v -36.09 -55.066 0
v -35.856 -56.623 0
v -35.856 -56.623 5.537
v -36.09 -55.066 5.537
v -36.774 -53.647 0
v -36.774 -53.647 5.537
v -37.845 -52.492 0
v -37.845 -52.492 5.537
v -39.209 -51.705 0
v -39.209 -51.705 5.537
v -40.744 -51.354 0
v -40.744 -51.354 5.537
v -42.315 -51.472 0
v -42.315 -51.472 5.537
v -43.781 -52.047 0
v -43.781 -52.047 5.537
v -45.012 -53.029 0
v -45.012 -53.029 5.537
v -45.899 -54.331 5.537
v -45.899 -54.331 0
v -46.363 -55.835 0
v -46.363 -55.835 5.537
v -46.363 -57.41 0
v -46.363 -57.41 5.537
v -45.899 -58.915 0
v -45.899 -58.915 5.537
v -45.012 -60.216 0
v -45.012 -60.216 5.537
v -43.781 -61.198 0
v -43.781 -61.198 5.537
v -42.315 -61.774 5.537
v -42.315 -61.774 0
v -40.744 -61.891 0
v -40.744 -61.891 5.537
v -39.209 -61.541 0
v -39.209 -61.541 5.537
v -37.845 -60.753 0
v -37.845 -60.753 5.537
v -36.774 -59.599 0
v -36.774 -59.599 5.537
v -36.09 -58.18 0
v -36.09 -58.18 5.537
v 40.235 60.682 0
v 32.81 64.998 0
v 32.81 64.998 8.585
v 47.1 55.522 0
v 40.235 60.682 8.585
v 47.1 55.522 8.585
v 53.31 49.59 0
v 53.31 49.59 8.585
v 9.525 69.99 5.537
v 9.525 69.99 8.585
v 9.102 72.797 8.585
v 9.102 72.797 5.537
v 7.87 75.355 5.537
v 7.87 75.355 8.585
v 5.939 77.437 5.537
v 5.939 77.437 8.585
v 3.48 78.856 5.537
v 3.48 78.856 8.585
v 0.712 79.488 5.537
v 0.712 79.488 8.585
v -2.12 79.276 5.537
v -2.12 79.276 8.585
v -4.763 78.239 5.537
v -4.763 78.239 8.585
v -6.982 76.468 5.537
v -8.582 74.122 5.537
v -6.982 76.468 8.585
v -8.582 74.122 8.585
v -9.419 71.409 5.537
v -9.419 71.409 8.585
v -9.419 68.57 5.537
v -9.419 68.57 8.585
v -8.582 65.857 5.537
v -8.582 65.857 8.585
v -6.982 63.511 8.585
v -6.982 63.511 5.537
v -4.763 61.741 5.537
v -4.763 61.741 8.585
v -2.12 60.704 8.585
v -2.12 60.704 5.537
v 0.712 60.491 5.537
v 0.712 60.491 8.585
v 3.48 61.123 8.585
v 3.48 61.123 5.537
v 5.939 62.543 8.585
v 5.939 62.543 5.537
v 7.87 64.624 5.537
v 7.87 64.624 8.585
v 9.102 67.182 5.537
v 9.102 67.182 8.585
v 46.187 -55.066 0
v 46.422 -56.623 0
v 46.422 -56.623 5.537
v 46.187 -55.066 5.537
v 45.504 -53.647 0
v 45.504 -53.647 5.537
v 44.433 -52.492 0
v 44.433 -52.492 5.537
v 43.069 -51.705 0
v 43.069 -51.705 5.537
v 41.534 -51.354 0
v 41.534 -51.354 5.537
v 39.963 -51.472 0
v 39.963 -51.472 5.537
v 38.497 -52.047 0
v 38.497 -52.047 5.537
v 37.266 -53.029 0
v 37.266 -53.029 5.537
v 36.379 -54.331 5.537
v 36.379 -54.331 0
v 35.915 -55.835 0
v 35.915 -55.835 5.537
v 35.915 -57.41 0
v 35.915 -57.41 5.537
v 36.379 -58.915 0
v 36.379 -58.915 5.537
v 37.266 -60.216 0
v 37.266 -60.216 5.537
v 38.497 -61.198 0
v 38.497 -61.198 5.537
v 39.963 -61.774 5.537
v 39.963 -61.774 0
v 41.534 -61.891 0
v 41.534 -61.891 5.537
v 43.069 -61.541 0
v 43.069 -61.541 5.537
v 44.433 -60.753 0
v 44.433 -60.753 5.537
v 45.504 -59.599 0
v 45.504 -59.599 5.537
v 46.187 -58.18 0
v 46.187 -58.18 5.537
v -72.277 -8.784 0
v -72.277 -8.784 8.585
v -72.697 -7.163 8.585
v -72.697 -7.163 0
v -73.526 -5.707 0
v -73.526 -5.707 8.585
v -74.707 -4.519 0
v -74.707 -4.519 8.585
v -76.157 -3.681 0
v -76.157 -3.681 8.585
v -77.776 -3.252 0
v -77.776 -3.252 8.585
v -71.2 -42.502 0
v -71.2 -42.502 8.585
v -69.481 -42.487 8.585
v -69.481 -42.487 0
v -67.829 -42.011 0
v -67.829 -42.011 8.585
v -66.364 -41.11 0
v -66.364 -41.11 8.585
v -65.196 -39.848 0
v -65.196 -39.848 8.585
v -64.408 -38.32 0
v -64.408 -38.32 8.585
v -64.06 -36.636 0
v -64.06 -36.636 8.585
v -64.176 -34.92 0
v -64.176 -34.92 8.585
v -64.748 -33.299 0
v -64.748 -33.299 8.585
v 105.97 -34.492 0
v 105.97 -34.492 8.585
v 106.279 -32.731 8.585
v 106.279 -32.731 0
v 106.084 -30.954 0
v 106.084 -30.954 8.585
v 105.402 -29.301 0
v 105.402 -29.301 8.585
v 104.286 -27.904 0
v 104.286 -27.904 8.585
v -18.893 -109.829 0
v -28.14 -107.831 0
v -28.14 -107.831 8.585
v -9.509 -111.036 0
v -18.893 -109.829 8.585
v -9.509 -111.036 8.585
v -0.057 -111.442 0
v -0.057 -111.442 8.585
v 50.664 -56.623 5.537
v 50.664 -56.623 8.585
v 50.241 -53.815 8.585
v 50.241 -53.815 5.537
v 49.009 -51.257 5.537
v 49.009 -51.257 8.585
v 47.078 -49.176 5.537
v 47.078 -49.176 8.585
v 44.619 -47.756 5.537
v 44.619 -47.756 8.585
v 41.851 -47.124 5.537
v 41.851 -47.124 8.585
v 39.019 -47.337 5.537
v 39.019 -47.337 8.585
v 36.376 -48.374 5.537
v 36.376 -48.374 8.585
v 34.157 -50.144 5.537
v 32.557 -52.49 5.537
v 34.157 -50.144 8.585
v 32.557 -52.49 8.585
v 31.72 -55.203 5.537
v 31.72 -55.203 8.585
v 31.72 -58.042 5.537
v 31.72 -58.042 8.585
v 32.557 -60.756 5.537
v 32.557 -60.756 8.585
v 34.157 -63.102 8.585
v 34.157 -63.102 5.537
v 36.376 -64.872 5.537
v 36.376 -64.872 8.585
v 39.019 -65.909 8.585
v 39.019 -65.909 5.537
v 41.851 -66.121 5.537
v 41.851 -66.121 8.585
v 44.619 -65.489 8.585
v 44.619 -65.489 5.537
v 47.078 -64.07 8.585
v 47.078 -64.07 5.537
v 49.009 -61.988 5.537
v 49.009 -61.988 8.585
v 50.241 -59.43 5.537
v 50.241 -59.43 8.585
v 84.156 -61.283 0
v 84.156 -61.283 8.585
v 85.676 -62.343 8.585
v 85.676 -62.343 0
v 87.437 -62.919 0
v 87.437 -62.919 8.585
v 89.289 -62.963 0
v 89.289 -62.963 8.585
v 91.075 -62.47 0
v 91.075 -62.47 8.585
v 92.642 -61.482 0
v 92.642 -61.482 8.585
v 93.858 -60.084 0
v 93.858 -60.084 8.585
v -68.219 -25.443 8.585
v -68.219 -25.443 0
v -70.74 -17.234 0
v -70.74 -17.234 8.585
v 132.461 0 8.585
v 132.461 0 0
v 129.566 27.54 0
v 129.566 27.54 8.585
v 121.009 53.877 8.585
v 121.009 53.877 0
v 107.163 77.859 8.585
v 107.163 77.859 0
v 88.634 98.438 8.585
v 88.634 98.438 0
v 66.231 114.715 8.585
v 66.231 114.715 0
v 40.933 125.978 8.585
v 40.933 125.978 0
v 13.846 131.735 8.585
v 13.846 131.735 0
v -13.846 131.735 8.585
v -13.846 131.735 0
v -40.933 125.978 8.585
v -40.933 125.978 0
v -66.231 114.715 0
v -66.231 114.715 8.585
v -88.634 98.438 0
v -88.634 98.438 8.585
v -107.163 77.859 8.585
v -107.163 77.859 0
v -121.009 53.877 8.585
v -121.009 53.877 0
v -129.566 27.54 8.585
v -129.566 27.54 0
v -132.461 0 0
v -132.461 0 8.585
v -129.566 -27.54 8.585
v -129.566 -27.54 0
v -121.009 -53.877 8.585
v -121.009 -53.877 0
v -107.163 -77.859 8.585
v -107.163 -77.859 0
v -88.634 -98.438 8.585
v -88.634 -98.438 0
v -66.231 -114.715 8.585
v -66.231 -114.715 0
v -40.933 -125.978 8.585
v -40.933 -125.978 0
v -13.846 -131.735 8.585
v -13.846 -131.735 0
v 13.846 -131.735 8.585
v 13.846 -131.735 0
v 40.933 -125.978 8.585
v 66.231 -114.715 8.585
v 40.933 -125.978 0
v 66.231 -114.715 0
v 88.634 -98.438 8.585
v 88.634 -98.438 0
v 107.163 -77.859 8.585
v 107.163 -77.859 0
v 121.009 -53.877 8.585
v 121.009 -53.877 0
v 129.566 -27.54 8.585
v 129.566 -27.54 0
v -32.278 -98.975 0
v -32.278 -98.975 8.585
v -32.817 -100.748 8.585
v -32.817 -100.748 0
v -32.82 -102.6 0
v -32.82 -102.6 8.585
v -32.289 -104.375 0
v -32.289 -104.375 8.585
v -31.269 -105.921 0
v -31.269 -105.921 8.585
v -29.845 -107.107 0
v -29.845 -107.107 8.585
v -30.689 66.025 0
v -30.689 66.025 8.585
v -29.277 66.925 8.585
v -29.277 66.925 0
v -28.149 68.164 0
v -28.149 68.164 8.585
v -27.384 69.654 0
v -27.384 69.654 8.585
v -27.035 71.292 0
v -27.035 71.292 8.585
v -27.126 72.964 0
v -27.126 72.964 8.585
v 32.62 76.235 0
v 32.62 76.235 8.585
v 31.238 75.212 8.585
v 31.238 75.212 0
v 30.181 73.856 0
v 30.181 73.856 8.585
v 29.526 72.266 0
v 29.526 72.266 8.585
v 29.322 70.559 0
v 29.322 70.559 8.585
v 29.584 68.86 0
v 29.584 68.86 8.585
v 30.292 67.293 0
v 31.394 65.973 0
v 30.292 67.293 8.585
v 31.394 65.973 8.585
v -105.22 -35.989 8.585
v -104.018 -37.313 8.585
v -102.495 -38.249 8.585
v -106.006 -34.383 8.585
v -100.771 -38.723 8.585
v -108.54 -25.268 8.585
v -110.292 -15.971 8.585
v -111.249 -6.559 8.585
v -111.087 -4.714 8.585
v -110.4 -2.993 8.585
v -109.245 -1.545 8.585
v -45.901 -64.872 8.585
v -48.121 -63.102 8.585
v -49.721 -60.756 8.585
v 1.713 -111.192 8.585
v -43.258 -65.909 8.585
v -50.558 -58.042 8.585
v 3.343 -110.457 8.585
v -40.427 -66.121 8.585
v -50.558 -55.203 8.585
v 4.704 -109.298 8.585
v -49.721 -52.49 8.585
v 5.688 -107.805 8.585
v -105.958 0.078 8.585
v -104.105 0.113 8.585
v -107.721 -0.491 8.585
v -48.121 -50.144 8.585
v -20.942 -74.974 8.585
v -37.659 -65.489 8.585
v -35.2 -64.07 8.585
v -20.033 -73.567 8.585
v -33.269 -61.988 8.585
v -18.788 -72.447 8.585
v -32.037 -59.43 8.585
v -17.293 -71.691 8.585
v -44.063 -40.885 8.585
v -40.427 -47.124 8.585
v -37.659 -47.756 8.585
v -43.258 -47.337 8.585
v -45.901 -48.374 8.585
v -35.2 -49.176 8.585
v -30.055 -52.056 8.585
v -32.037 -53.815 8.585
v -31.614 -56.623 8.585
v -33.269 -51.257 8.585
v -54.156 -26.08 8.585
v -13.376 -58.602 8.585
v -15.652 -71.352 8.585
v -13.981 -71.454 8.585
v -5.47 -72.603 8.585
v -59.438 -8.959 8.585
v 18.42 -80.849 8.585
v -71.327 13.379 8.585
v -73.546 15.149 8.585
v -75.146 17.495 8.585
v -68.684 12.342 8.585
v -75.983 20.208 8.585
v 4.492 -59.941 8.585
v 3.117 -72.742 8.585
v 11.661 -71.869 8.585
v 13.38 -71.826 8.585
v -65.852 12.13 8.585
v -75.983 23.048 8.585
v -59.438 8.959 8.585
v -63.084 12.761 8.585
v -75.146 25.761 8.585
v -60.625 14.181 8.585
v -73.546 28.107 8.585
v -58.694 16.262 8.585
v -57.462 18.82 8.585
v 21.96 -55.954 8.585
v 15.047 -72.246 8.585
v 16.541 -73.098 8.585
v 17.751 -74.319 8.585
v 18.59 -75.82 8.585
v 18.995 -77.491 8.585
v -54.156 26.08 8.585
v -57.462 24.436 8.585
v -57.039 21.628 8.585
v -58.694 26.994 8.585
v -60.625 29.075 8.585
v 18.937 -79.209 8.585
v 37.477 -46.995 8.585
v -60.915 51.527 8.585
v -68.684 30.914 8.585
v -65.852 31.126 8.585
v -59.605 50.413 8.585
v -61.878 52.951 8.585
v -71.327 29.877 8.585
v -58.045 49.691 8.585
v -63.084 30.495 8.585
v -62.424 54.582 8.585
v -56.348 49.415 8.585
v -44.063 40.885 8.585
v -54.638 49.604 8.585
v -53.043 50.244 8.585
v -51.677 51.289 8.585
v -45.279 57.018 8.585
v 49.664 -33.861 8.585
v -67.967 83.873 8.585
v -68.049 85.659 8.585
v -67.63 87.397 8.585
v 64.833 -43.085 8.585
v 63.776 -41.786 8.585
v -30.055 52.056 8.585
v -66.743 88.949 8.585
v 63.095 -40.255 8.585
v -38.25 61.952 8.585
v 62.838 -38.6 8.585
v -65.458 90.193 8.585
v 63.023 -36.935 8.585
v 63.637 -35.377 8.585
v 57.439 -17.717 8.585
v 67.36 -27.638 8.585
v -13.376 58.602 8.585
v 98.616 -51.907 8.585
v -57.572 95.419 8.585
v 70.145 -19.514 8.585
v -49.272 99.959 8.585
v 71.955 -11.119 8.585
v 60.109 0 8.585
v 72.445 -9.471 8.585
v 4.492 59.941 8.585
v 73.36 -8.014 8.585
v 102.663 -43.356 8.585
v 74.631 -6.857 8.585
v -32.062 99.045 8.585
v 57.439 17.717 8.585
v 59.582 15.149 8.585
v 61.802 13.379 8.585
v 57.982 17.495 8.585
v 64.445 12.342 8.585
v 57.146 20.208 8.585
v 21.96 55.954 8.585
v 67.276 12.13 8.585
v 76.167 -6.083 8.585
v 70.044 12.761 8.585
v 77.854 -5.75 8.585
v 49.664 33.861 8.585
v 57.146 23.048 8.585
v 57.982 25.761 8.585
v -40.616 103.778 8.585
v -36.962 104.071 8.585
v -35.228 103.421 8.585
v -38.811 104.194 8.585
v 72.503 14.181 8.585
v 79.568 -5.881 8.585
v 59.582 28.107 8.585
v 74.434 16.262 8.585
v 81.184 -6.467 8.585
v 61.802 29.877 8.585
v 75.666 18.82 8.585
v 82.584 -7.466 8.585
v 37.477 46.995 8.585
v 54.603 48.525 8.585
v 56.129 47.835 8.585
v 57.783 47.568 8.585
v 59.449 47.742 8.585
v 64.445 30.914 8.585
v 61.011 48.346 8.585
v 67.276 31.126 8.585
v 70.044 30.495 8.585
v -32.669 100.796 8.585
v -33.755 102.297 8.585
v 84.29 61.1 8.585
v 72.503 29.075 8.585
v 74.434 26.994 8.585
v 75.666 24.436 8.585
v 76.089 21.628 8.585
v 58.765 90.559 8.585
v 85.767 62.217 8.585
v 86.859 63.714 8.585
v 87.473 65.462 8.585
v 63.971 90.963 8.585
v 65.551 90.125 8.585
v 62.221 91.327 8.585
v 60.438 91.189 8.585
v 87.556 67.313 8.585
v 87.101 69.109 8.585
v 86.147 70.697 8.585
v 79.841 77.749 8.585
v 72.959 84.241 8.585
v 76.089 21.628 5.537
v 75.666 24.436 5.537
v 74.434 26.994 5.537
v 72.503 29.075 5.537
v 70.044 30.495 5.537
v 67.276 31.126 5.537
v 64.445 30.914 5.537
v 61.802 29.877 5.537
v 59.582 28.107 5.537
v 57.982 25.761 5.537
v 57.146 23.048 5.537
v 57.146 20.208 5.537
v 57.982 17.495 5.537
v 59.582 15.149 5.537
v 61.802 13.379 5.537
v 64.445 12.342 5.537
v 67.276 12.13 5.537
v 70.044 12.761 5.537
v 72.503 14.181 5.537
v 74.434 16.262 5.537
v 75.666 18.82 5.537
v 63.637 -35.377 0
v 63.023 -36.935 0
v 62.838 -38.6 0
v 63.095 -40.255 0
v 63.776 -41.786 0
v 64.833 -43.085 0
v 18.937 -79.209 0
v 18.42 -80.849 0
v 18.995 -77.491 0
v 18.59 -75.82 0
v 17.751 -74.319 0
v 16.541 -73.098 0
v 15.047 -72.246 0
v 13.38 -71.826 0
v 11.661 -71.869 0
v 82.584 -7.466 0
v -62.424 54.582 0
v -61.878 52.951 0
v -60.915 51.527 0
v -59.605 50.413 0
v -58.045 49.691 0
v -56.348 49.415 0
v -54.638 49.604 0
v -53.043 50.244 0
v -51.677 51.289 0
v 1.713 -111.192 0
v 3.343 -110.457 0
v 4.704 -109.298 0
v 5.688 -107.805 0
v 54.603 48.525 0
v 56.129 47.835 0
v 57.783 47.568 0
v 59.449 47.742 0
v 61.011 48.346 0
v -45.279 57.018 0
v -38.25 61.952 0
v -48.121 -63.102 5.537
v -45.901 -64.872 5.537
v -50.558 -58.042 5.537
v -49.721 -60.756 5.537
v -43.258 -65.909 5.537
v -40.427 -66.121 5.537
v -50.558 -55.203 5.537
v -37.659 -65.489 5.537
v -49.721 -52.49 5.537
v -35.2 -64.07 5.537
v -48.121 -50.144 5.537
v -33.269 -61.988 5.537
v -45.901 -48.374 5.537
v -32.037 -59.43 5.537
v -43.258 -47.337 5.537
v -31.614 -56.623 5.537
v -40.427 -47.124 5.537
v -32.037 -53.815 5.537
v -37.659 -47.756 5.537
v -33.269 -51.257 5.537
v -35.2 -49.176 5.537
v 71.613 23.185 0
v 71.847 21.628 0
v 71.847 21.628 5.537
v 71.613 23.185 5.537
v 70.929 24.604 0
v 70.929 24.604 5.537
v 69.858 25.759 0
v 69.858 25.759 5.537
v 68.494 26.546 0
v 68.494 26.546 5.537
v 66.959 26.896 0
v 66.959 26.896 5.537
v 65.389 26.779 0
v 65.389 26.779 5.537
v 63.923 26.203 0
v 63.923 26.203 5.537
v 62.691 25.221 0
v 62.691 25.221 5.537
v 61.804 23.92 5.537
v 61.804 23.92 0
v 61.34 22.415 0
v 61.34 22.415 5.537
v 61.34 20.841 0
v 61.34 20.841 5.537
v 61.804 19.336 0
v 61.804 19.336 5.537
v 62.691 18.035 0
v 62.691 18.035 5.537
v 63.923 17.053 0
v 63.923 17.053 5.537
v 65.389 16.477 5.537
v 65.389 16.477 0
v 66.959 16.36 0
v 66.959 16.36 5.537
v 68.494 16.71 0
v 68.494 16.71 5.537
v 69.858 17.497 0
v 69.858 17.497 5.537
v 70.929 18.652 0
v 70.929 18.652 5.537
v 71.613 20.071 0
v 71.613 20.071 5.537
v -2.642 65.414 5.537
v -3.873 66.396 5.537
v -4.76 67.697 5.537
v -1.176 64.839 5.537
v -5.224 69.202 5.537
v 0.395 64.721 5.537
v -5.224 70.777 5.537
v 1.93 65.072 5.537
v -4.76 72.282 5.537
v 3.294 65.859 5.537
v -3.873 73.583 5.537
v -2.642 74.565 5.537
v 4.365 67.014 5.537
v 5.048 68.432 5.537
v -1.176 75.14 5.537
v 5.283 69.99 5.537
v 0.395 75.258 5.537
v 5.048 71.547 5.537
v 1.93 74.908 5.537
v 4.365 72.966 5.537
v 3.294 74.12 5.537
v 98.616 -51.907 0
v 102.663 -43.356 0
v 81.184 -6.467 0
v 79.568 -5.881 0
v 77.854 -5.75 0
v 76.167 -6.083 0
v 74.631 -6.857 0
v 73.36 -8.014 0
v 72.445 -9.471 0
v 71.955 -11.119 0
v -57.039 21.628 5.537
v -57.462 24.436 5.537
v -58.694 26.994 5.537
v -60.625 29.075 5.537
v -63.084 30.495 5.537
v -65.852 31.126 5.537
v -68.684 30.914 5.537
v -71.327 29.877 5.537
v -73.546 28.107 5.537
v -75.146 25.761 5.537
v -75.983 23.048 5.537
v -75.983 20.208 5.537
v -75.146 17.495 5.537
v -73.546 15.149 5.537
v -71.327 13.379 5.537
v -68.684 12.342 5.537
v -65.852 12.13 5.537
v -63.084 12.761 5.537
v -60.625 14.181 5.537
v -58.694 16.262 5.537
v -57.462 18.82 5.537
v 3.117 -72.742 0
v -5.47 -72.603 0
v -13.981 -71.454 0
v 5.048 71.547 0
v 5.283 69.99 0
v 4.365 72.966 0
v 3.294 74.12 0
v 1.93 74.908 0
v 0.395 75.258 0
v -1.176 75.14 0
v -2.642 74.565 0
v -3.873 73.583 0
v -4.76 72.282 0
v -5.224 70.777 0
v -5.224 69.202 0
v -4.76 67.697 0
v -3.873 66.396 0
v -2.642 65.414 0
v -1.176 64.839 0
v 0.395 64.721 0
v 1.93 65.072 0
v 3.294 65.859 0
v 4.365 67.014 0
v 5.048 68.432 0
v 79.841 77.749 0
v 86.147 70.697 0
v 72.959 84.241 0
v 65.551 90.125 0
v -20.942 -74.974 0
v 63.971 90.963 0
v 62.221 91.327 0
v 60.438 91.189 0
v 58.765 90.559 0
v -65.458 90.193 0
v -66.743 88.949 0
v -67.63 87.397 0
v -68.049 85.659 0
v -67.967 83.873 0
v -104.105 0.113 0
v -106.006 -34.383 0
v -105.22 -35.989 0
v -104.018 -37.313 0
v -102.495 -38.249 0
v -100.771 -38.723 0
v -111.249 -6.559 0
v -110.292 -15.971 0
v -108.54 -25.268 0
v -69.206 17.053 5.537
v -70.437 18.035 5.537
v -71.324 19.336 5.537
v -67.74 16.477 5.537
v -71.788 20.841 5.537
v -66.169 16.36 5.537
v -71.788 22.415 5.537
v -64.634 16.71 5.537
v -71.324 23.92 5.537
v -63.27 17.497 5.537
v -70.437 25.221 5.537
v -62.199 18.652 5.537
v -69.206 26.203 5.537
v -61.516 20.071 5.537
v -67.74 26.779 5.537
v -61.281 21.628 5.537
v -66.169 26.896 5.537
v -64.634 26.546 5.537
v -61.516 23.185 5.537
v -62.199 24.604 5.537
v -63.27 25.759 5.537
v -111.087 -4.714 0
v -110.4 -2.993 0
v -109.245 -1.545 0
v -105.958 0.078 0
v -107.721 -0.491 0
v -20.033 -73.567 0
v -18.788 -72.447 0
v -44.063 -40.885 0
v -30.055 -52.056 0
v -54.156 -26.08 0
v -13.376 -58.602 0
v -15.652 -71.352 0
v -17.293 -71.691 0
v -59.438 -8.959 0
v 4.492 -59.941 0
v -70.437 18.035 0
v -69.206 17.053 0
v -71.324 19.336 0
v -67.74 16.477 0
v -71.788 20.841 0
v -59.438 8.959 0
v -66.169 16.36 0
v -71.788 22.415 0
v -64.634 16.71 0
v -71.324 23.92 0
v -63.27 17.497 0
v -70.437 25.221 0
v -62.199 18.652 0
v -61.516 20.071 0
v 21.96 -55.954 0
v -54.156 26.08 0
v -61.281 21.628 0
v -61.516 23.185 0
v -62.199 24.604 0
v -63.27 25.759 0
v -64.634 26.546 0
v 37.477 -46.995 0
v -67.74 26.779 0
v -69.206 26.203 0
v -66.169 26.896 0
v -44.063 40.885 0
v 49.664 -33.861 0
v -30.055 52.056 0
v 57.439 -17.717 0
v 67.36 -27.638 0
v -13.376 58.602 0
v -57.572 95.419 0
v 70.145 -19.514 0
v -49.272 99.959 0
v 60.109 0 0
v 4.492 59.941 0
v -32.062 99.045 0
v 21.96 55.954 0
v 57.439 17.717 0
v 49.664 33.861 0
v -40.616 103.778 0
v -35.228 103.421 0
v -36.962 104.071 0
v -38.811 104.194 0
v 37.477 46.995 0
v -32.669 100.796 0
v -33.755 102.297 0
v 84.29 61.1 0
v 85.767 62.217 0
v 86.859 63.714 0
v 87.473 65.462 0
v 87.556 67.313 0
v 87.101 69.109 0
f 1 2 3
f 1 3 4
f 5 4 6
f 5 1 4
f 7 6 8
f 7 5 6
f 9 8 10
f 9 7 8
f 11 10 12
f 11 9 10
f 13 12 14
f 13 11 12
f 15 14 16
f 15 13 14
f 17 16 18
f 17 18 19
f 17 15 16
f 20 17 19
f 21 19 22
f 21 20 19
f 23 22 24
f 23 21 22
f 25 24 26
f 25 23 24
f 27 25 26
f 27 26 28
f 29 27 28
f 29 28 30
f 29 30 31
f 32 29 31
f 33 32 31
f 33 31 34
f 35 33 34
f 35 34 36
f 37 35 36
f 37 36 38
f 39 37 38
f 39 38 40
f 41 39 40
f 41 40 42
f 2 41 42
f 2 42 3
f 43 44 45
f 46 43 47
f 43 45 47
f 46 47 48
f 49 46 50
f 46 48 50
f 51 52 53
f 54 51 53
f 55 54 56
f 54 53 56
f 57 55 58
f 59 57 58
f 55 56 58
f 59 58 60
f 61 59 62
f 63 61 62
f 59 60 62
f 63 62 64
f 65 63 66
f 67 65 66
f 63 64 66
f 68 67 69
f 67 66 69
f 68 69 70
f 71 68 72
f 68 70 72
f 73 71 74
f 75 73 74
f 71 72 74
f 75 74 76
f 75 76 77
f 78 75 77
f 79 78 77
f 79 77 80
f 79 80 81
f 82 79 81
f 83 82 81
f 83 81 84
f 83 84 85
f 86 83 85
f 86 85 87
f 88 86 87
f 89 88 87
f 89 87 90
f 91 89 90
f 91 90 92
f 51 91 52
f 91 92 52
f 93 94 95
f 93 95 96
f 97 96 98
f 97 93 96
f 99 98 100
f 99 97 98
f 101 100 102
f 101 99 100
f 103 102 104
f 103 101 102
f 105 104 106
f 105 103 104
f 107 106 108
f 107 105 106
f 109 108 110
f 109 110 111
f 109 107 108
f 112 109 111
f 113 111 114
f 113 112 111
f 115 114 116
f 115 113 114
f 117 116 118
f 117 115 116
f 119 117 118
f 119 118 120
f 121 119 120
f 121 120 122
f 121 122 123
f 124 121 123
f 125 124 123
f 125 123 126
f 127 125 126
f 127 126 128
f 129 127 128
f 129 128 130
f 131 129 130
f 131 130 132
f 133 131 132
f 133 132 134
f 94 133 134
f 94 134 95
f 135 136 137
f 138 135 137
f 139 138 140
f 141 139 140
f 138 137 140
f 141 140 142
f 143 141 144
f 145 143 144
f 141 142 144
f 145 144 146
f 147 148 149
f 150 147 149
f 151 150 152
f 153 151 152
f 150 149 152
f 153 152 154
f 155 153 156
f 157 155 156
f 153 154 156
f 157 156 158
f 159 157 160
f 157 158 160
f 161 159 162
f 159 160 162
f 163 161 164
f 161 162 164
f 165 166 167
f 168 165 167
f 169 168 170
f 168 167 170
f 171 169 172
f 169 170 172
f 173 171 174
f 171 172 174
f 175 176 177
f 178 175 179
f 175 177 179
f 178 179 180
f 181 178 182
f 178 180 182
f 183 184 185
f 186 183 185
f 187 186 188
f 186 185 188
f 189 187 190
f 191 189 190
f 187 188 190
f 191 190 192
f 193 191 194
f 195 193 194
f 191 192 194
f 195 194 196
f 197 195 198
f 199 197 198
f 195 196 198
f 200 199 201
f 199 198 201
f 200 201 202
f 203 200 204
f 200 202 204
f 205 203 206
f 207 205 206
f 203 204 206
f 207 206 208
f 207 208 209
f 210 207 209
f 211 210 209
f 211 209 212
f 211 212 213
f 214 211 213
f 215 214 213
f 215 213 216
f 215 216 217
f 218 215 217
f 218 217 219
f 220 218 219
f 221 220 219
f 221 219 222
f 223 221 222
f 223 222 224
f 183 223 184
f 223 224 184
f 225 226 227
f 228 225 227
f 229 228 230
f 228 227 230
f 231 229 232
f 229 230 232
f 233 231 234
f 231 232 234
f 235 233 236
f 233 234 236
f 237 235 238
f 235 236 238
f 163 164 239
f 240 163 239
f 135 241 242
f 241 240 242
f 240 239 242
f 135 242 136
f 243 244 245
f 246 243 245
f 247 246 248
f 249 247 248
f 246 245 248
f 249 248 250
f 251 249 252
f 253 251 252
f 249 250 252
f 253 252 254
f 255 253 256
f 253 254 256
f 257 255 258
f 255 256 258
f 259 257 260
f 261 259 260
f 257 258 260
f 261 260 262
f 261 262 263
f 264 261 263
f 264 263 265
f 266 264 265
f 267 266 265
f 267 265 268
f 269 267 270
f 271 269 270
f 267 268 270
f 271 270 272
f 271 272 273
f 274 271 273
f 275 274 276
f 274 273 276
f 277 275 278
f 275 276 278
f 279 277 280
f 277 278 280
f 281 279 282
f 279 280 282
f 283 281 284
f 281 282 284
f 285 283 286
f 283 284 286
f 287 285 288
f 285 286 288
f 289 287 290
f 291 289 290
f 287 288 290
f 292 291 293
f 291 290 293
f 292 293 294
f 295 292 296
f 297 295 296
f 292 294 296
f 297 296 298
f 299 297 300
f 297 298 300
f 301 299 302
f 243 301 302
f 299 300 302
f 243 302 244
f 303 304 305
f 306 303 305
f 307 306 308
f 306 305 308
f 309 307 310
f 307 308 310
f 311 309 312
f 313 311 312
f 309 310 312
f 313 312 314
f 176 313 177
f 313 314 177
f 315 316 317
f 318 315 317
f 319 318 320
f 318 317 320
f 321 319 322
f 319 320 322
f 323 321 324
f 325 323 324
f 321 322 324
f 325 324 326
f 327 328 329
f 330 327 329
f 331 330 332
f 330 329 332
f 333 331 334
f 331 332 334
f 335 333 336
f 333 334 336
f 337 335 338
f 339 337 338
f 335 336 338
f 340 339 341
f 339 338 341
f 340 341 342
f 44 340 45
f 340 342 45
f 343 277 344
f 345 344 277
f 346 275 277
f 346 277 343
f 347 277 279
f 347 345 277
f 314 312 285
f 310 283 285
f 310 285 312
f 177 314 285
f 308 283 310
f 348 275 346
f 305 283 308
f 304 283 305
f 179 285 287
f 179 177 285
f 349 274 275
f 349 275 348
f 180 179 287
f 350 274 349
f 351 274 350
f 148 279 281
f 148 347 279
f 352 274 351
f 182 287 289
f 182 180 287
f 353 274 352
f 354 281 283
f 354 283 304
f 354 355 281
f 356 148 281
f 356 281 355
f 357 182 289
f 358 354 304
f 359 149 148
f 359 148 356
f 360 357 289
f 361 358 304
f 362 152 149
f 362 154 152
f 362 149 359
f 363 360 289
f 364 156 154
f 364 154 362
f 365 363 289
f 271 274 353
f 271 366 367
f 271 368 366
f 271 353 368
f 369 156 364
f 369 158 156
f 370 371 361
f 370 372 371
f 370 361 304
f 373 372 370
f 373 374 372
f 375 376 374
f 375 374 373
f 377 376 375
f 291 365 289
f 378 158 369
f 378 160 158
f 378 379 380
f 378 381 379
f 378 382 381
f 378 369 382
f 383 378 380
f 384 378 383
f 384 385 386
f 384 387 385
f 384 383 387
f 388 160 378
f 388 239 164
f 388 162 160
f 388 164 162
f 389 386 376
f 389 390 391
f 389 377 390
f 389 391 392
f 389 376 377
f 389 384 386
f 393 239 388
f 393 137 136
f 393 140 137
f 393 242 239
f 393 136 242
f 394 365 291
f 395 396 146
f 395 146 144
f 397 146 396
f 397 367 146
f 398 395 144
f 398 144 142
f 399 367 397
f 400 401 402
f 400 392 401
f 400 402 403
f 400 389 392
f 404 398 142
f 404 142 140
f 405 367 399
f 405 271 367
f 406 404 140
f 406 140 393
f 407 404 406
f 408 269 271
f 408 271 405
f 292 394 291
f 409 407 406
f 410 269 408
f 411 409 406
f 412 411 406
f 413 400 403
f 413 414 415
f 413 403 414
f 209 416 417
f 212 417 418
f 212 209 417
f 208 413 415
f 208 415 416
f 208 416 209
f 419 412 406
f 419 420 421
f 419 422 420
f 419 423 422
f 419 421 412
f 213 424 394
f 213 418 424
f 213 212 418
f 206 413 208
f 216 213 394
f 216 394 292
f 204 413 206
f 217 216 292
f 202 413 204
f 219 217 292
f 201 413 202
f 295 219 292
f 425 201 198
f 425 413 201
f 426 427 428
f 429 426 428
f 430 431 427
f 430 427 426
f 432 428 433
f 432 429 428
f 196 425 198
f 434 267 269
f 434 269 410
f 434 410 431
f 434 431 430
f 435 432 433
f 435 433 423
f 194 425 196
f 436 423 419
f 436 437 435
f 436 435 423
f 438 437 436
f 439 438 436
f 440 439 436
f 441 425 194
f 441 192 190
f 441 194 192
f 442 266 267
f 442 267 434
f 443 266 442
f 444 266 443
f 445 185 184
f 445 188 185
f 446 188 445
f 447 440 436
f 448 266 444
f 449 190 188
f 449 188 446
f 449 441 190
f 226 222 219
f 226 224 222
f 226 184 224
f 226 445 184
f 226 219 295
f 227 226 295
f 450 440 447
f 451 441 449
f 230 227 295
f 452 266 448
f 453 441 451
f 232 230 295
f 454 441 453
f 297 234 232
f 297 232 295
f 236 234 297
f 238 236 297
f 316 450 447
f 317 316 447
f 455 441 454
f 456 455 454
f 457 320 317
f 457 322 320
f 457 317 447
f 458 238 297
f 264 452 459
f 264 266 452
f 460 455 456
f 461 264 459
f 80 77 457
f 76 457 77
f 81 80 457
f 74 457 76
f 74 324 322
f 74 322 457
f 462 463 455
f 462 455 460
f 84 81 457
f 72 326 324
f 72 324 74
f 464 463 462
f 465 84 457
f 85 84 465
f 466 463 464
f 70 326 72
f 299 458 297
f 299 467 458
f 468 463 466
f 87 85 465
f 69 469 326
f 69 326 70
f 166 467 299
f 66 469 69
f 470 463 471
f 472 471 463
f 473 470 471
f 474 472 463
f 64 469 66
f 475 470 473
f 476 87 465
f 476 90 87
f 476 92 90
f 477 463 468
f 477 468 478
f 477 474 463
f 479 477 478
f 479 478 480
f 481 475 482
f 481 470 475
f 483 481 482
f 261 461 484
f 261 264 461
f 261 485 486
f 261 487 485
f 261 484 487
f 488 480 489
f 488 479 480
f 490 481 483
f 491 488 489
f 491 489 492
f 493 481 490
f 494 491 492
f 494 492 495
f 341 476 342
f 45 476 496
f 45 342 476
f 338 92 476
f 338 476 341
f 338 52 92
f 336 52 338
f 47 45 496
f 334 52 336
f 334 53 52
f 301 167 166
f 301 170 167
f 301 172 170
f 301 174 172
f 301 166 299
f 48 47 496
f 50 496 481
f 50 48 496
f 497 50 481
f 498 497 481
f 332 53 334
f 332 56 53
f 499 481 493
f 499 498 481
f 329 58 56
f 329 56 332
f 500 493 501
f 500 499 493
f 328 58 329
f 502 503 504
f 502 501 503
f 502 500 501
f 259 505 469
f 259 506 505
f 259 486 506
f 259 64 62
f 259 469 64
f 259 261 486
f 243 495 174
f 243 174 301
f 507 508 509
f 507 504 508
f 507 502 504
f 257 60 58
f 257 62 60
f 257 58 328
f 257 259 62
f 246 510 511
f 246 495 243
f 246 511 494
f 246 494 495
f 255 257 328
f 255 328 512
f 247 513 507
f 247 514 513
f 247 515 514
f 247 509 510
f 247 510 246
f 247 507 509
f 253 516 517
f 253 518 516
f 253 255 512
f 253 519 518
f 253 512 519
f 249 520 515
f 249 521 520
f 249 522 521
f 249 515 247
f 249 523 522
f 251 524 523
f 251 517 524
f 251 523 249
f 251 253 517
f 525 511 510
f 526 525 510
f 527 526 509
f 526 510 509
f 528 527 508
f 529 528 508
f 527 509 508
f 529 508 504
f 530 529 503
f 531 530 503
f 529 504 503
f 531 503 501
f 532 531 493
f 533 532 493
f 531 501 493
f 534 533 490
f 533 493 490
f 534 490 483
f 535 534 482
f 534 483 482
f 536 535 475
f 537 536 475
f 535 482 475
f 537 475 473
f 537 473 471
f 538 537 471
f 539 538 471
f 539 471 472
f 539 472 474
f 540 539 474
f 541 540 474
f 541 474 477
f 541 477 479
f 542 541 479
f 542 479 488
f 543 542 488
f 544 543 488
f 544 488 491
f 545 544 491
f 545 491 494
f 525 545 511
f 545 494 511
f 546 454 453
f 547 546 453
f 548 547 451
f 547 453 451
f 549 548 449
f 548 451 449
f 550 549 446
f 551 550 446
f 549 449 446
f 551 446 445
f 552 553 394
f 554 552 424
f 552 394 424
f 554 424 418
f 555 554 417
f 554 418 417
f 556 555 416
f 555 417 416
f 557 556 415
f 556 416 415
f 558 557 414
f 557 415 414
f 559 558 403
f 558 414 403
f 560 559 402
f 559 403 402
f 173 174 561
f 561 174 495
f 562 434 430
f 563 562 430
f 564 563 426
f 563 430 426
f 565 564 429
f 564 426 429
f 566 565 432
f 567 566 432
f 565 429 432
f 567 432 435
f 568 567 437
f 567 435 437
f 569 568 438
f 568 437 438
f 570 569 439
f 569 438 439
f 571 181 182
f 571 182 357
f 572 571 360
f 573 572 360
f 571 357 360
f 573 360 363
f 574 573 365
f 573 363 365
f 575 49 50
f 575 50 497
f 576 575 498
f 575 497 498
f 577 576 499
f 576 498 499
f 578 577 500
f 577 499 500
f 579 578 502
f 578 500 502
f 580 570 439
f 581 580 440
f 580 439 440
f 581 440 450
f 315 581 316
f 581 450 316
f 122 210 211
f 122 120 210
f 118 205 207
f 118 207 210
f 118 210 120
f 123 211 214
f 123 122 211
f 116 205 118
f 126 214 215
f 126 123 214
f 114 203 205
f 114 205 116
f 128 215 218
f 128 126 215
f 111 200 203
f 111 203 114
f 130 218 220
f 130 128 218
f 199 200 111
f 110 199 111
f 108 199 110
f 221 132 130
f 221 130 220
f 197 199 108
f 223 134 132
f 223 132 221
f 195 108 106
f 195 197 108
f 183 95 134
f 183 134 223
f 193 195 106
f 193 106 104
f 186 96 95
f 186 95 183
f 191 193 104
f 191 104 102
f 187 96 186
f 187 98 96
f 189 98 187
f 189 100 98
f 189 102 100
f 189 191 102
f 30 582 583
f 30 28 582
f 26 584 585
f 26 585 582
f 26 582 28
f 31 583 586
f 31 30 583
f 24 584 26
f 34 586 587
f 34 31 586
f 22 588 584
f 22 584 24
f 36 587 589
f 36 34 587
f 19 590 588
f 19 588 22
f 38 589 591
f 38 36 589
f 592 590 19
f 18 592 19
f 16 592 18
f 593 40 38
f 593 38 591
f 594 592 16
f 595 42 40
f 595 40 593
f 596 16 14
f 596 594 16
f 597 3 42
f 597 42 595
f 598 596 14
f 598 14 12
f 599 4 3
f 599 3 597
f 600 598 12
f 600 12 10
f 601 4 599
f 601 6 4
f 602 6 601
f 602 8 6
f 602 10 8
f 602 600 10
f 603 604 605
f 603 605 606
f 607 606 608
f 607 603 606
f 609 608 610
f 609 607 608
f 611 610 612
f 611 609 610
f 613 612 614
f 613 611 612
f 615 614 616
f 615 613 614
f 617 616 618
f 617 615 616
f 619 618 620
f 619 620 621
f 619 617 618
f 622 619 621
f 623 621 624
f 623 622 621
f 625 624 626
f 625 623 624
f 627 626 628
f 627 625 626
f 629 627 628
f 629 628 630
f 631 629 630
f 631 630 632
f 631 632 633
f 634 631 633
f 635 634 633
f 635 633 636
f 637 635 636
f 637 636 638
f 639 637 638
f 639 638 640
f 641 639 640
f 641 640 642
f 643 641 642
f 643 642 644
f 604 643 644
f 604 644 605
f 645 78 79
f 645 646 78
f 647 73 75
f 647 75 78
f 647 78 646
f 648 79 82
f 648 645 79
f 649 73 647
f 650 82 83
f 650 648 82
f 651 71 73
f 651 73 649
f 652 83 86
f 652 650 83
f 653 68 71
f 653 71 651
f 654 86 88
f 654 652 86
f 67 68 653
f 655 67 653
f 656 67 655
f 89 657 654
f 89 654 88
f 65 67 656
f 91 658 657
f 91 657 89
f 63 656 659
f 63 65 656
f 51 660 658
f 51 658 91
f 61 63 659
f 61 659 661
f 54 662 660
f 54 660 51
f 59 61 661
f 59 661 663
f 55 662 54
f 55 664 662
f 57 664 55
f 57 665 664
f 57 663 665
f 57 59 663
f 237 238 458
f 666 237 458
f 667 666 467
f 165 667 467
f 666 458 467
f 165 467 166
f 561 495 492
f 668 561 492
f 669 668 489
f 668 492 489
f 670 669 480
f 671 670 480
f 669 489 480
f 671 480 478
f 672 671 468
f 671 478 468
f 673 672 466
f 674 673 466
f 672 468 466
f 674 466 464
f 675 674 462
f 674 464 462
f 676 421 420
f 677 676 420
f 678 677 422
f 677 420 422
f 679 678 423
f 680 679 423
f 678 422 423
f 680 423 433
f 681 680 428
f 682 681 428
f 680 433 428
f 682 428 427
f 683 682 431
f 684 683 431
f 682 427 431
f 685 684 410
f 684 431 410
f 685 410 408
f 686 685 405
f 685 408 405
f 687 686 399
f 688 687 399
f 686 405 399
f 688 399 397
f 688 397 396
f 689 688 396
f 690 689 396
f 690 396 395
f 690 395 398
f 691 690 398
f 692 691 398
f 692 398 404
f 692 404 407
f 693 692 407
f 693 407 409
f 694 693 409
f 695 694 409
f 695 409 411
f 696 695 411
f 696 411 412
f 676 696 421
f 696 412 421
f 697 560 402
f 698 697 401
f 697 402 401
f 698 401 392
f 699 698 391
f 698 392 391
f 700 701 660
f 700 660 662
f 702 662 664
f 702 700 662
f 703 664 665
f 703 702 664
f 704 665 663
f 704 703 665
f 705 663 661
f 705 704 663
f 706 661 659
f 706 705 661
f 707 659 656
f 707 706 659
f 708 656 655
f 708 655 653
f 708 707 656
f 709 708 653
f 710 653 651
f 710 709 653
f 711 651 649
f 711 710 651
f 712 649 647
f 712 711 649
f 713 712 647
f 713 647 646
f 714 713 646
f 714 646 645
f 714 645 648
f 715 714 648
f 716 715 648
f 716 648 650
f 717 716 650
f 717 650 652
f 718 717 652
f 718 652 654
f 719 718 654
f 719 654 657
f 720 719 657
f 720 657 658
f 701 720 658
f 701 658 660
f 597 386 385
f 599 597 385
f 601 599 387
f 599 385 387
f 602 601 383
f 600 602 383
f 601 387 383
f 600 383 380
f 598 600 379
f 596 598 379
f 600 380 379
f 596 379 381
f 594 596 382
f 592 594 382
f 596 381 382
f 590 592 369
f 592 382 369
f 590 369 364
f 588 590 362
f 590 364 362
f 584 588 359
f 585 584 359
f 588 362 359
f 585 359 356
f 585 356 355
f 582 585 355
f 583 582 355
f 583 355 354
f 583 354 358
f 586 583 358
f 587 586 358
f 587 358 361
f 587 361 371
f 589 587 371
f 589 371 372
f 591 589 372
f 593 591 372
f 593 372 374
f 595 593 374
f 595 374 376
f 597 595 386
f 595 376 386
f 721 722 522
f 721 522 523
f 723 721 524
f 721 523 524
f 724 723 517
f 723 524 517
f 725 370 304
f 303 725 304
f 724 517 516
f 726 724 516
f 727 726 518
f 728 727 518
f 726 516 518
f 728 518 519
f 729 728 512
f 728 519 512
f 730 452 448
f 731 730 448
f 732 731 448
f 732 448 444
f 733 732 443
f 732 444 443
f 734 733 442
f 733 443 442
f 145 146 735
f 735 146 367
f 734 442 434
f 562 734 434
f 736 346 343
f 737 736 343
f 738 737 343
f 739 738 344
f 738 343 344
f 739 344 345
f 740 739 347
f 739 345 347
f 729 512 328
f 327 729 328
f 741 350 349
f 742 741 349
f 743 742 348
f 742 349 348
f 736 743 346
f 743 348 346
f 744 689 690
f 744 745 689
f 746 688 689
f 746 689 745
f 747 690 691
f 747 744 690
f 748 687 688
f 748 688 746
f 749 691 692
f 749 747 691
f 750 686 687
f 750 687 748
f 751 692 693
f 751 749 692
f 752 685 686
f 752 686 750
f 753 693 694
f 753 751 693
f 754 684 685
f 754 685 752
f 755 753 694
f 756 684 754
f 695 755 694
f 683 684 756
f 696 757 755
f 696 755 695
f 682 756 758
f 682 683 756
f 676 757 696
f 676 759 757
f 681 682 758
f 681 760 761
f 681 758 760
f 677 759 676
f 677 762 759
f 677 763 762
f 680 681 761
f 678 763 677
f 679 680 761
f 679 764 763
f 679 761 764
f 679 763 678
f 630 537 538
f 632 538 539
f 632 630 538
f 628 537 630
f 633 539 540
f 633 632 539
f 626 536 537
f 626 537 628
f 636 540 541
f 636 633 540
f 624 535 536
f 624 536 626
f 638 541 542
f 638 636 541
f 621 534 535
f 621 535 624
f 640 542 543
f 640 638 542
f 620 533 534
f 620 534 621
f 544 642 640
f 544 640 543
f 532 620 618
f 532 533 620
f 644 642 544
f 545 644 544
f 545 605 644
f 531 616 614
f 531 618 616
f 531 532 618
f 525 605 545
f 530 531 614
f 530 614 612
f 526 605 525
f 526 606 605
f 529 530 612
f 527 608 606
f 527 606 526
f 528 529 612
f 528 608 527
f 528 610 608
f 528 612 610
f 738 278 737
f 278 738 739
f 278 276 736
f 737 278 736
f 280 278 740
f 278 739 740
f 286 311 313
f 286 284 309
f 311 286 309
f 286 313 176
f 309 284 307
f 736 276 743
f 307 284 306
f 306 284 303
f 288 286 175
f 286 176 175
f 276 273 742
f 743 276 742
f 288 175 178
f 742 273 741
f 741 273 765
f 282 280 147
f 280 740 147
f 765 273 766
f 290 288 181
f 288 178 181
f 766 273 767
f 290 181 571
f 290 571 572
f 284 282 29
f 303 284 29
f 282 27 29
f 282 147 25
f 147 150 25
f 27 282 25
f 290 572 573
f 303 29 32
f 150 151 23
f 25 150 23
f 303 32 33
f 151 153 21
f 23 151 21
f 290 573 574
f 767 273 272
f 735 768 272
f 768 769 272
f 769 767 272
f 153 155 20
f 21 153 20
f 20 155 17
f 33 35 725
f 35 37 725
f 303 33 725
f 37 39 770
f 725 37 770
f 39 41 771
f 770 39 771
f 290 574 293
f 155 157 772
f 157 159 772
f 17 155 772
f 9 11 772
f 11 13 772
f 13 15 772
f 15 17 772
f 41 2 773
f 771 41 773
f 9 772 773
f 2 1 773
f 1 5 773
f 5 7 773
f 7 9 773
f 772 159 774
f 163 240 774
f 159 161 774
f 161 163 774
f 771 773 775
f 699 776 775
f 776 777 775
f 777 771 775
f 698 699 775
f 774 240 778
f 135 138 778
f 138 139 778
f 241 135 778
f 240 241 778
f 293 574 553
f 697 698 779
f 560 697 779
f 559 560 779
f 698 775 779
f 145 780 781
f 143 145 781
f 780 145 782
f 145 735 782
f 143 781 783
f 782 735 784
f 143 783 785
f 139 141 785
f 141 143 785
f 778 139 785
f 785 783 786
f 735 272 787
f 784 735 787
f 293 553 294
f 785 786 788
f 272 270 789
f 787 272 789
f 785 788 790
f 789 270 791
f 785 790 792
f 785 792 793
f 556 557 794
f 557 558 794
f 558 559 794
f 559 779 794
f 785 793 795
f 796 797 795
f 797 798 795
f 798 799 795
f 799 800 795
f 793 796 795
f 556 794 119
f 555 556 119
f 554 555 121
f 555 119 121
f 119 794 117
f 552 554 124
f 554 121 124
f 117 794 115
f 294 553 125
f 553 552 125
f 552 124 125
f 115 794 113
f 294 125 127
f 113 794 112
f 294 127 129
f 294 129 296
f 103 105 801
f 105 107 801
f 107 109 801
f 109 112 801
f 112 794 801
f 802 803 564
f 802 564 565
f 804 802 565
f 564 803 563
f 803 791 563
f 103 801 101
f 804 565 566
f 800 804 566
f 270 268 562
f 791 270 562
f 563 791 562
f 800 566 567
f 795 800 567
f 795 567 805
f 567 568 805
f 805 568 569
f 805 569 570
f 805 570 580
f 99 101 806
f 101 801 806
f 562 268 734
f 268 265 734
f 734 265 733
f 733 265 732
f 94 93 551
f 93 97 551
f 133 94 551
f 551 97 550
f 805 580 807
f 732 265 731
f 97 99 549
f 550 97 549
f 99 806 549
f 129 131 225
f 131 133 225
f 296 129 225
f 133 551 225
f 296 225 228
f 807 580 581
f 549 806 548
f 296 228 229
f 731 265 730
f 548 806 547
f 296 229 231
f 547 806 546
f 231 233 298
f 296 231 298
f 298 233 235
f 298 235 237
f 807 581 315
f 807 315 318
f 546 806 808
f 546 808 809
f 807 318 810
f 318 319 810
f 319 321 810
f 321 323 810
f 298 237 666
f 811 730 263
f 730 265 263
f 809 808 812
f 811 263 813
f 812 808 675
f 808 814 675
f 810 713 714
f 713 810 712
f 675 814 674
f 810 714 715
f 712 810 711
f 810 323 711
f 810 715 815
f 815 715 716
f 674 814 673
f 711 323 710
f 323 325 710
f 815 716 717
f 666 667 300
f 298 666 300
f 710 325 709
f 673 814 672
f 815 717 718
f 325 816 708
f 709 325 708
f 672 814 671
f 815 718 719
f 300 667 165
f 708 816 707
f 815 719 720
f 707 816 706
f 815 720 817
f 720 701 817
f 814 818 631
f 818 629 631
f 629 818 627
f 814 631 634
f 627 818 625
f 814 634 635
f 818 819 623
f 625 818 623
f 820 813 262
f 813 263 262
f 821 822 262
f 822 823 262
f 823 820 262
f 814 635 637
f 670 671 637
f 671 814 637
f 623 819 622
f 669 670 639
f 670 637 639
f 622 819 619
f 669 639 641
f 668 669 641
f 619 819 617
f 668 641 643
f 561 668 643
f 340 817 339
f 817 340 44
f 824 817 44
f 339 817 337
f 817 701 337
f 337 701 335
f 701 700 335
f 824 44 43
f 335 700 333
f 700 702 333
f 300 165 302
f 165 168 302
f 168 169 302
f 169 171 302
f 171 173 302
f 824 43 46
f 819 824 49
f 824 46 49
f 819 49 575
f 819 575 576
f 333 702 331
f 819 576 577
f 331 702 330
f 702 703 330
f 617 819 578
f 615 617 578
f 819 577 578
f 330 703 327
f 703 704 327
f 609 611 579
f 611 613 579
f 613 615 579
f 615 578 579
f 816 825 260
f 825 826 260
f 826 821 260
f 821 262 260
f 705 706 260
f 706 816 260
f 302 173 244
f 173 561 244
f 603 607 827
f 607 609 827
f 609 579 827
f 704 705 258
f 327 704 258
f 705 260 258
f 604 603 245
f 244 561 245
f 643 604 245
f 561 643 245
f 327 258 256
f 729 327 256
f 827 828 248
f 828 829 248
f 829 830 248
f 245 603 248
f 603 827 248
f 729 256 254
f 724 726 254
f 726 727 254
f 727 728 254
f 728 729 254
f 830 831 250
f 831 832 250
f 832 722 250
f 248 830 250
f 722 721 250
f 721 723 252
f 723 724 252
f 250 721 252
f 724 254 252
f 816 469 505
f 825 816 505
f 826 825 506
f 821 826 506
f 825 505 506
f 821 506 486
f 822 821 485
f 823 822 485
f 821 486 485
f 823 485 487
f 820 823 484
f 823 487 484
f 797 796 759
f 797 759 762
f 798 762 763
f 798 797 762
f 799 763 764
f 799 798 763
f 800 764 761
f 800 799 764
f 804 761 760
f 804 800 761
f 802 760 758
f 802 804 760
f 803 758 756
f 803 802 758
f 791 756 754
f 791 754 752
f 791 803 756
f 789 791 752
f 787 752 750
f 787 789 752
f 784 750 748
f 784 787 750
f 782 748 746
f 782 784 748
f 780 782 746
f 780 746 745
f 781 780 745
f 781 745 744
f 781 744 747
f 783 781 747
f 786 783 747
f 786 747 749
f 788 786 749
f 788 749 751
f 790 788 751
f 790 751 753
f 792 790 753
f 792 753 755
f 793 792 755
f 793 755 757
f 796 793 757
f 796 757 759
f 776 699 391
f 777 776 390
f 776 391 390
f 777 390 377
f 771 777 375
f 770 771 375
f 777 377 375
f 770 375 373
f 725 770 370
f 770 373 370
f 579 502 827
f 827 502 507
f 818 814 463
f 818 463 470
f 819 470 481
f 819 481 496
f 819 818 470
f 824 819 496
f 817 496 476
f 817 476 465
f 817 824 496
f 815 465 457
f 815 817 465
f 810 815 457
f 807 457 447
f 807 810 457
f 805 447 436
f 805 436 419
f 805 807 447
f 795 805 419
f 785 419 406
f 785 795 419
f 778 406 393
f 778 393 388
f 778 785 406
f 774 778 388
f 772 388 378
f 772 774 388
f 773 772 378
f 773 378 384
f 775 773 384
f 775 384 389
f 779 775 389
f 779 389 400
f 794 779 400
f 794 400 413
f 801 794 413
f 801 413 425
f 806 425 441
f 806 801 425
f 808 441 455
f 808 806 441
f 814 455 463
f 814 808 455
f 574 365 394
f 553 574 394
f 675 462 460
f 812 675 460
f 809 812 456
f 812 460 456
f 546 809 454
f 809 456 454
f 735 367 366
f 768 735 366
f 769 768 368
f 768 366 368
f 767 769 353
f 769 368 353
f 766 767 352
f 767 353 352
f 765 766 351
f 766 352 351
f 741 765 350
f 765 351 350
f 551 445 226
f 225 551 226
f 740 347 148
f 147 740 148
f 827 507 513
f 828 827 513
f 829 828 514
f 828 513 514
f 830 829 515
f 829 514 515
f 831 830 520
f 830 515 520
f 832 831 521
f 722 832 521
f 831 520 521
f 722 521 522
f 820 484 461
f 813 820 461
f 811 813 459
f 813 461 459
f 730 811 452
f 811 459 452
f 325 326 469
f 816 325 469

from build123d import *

# Parameters (mm, degrees)
F0_R     = 132.461
F0_R_2   = 124.1425
F0_R_3   = 9.525
F0_R_4   = 60.1091
F0_R_5   = 5.2832
F1_DEPTH = 8.5852
F2_R     = 9.525
F2_R_2   = 5.2832
F3_DEPTH = 3.048
F5_DEPTH = 8.5862


with BuildPart() as f1:
    # F0 (on Top) → F1 (new body)
    with BuildSketch(Plane.XY):
        Circle(F0_R)
        Circle(F0_R_2, mode=Mode.SUBTRACT)
        Circle(F0_R_2)
        with Locations((-41.1389134724, -56.6228567312)):
            Circle(F0_R_3, mode=Mode.SUBTRACT)
        with Locations((41.1389134724, -56.6228567312)):
            Circle(F0_R_3, mode=Mode.SUBTRACT)
        with Locations((-66.5641602585, 21.6280067312)):
            Circle(F0_R_3, mode=Mode.SUBTRACT)
        Circle(F0_R_4, mode=Mode.SUBTRACT)
        with Locations((66.5641602585, 21.6280067312)):
            Circle(F0_R_3, mode=Mode.SUBTRACT)
        with Locations((0, 69.9897)):
            Circle(F0_R_3, mode=Mode.SUBTRACT)
        with Locations((0, 69.9897)):
            Circle(F0_R_3)
        with Locations((0, 69.9897)):
            Circle(F0_R_5, mode=Mode.SUBTRACT)
        with Locations((66.5641602585, 21.6280067312)):
            Circle(F0_R_3)
        with Locations((66.5641602585, 21.6280067312)):
            Circle(F0_R_5, mode=Mode.SUBTRACT)
        with Locations((41.1389134724, -56.6228567312)):
            Circle(F0_R_3)
        with Locations((41.1389134724, -56.6228567312)):
            Circle(F0_R_5, mode=Mode.SUBTRACT)
        with Locations((-41.1389134724, -56.6228567312)):
            Circle(F0_R_3)
        with Locations((-41.1389134724, -56.6228567312)):
            Circle(F0_R_5, mode=Mode.SUBTRACT)
        with Locations((-66.5641602585, 21.6280067312)):
            Circle(F0_R_3)
        with Locations((-66.5641602585, 21.6280067312)):
            Circle(F0_R_5, mode=Mode.SUBTRACT)
    extrude(amount=F1_DEPTH)

    # F2 (on face) → F3 (cut)
    with BuildSketch(Plane.XY.offset(8.5852)):
        with Locations((-66.5641602585, 21.6280067312)):
            Circle(F2_R)
        with Locations((-66.5641602585, 21.6280067312)):
            Circle(F2_R_2, mode=Mode.SUBTRACT)
        with Locations((0, 69.9897)):
            Circle(F2_R)
        with Locations((0, 69.9897)):
            Circle(F2_R_2, mode=Mode.SUBTRACT)
        with Locations((66.5641602585, 21.6280067312)):
            Circle(F2_R)
        with Locations((66.5641602585, 21.6280067312)):
            Circle(F2_R_2, mode=Mode.SUBTRACT)
        with Locations((41.1389134724, -56.6228567312)):
            Circle(F2_R)
        with Locations((41.1389134724, -56.6228567312)):
            Circle(F2_R_2, mode=Mode.SUBTRACT)
        with Locations((-41.1389134724, -56.6228567312)):
            Circle(F2_R)
        with Locations((-41.1389134724, -56.6228567312)):
            Circle(F2_R_2, mode=Mode.SUBTRACT)
    extrude(amount=-F3_DEPTH, mode=Mode.SUBTRACT)

    # F4 (on face) → F5 (cut, through all)
    with BuildSketch(Plane.XY.offset(8.5852)):
        with BuildLine():
            ThreePointArc((-51.6774888153, 51.2893964924), (-41.8372341216, 59.5886808368), (-30.6891923649, 66.0252869346))
            ThreePointArc((-30.6891923649, 66.0252869346), (-27.7167624168, 68.8833558466), (-27.1264884478, 72.9644677469))
            Line((-27.1264884478, 72.9644677469), (-32.0624553632, 99.0450873522))
            ThreePointArc((-32.0624553632, 99.0450873522), (-35.2275731763, 103.4205413877), (-40.6159999389, 103.7775089083))
            ThreePointArc((-40.6159999389, 103.7775089083), (-53.4701008219, 97.7771912275), (-65.45782702, 90.1925922017))
            ThreePointArc((-65.45782702, 90.1925922017), (-67.6298177949, 87.3968028542), (-67.9672788915, 83.8725863441))
            Line((-67.9672788915, 83.8725863441), (-62.4237511818, 54.5817422306))
            ThreePointArc((-62.4237511818, 54.5817422306), (-58.0446252801, 49.6911222717), (-51.6774888153, 51.2893964924))
        make_face()
        with BuildLine():
            ThreePointArc((53.3102973951, 49.5900920997), (56.9470138263, 47.6463350933), (61.0107865806, 48.3460841217))
            Line((61.0107865806, 48.3460841217), (84.2896321448, 61.0998223028))
            ThreePointArc((84.2896321448, 61.0998223028), (87.4728610235, 65.4621178788), (86.1472418675, 70.6971252943))
            ThreePointArc((86.1472418675, 70.6971252943), (76.468465017, 81.0679015652), (65.550671571, 90.125136687))
            ThreePointArc((65.550671571, 90.125136687), (62.2205358328, 91.3268762457), (58.7645255422, 90.5587780272))
            Line((58.7645255422, 90.5587780272), (32.6203216513, 76.2352012649))
            ThreePointArc((32.6203216513, 76.2352012649), (29.3222899949, 70.55912036), (32.8098924804, 64.997507631))
            ThreePointArc((32.8098924804, 64.997507631), (43.743786866, 58.203489186), (53.3102973951, 49.5900920997))
        make_face()
        with BuildLine():
            ThreePointArc((63.6367681054, -35.3769245118), (62.9119525193, -39.4363013195), (64.8332282349, -43.0849445367))
            Line((64.8332282349, -43.0849445367), (84.1563129279, -61.2833204626))
            ThreePointArc((84.1563129279, -61.2833204626), (89.288774382, -62.9627275631), (93.8579234501, -60.0842825695))
            ThreePointArc((93.8579234501, -60.0842825695), (100.73021127, -47.6744726636), (105.9703700363, -34.4921944885))
            ThreePointArc((105.9703700363, -34.4921944885), (106.0842237378, -30.953689248), (104.2857530094, -27.9041835437))
            Line((104.2857530094, -27.9041835437), (82.5842186863, -7.4657967097))
            ThreePointArc((82.5842186863, -7.4657967097), (76.1667971249, -6.0831876729), (71.9551175354, -11.1187275924))
            ThreePointArc((71.9551175354, -11.1187275924), (68.8723812014, -23.616946256), (63.6367681054, -35.3769245118))
        make_face()
        with BuildLine():
            ThreePointArc((-72.2772613638, -8.7842206572), (-74.076915058, -5.074079921), (-77.7758784367, -3.2515630831))
            Line((-77.7758784367, -3.2515630831), (-104.105319322, 0.1134080996))
            ThreePointArc((-104.105319322, 0.1134080996), (-109.2446985876, -1.5447081663), (-111.2493103168, -6.5590975212))
            ThreePointArc((-111.2493103168, -6.5590975212), (-109.5148047069, -20.6382740621), (-106.0058334991, -34.3830491728))
            ThreePointArc((-106.0058334991, -34.3830491728), (-104.018061883, -37.3126815737), (-100.77061402, -38.7226689421))
            Line((-100.77061402, -38.7226689421), (-71.2003215869, -42.5018294012))
            ThreePointArc((-71.2003215869, -42.5018294012), (-65.1958412822, -39.848317857), (-64.7483370215, -33.2989173362))
            ThreePointArc((-64.7483370215, -33.2989173362), (-69.6006195485, -21.3756590841), (-72.2772613638, -8.7842206572))
        make_face()
        with BuildLine():
            ThreePointArc((-13.9806117717, -71.4542338654), (-18.0652888708, -72.0193096994), (-20.941647931, -74.9740442488))
            Line((-20.941647931, -74.9740442488), (-32.2781703875, -98.9749972921))
            ThreePointArc((-32.2781703875, -98.9749972921), (-32.2893636416, -104.3752235372), (-28.1398550618, -107.8312541119))
            ThreePointArc((-28.1398550618, -107.8312541119), (-14.2137707582, -110.532346067), (-0.0573810882, -111.4424852274))
            ThreePointArc((-0.0573810882, -111.4424852274), (3.3431201074, -110.4573082782), (5.68761436, -107.8045118855))
            Line((5.68761436, -107.8045118855), (18.4195324312, -80.8493173845))
            ThreePointArc((18.4195324312, -80.8493173845), (17.7513794425, -74.3187371018), (11.660815821, -71.8692591947))
            ThreePointArc((11.660815821, -71.8692591947), (-1.1783143974, -72.7995646827), (-13.9806117717, -71.4542338654))
        make_face()
    extrude(amount=-F5_DEPTH, mode=Mode.SUBTRACT)


solid = f1.part
